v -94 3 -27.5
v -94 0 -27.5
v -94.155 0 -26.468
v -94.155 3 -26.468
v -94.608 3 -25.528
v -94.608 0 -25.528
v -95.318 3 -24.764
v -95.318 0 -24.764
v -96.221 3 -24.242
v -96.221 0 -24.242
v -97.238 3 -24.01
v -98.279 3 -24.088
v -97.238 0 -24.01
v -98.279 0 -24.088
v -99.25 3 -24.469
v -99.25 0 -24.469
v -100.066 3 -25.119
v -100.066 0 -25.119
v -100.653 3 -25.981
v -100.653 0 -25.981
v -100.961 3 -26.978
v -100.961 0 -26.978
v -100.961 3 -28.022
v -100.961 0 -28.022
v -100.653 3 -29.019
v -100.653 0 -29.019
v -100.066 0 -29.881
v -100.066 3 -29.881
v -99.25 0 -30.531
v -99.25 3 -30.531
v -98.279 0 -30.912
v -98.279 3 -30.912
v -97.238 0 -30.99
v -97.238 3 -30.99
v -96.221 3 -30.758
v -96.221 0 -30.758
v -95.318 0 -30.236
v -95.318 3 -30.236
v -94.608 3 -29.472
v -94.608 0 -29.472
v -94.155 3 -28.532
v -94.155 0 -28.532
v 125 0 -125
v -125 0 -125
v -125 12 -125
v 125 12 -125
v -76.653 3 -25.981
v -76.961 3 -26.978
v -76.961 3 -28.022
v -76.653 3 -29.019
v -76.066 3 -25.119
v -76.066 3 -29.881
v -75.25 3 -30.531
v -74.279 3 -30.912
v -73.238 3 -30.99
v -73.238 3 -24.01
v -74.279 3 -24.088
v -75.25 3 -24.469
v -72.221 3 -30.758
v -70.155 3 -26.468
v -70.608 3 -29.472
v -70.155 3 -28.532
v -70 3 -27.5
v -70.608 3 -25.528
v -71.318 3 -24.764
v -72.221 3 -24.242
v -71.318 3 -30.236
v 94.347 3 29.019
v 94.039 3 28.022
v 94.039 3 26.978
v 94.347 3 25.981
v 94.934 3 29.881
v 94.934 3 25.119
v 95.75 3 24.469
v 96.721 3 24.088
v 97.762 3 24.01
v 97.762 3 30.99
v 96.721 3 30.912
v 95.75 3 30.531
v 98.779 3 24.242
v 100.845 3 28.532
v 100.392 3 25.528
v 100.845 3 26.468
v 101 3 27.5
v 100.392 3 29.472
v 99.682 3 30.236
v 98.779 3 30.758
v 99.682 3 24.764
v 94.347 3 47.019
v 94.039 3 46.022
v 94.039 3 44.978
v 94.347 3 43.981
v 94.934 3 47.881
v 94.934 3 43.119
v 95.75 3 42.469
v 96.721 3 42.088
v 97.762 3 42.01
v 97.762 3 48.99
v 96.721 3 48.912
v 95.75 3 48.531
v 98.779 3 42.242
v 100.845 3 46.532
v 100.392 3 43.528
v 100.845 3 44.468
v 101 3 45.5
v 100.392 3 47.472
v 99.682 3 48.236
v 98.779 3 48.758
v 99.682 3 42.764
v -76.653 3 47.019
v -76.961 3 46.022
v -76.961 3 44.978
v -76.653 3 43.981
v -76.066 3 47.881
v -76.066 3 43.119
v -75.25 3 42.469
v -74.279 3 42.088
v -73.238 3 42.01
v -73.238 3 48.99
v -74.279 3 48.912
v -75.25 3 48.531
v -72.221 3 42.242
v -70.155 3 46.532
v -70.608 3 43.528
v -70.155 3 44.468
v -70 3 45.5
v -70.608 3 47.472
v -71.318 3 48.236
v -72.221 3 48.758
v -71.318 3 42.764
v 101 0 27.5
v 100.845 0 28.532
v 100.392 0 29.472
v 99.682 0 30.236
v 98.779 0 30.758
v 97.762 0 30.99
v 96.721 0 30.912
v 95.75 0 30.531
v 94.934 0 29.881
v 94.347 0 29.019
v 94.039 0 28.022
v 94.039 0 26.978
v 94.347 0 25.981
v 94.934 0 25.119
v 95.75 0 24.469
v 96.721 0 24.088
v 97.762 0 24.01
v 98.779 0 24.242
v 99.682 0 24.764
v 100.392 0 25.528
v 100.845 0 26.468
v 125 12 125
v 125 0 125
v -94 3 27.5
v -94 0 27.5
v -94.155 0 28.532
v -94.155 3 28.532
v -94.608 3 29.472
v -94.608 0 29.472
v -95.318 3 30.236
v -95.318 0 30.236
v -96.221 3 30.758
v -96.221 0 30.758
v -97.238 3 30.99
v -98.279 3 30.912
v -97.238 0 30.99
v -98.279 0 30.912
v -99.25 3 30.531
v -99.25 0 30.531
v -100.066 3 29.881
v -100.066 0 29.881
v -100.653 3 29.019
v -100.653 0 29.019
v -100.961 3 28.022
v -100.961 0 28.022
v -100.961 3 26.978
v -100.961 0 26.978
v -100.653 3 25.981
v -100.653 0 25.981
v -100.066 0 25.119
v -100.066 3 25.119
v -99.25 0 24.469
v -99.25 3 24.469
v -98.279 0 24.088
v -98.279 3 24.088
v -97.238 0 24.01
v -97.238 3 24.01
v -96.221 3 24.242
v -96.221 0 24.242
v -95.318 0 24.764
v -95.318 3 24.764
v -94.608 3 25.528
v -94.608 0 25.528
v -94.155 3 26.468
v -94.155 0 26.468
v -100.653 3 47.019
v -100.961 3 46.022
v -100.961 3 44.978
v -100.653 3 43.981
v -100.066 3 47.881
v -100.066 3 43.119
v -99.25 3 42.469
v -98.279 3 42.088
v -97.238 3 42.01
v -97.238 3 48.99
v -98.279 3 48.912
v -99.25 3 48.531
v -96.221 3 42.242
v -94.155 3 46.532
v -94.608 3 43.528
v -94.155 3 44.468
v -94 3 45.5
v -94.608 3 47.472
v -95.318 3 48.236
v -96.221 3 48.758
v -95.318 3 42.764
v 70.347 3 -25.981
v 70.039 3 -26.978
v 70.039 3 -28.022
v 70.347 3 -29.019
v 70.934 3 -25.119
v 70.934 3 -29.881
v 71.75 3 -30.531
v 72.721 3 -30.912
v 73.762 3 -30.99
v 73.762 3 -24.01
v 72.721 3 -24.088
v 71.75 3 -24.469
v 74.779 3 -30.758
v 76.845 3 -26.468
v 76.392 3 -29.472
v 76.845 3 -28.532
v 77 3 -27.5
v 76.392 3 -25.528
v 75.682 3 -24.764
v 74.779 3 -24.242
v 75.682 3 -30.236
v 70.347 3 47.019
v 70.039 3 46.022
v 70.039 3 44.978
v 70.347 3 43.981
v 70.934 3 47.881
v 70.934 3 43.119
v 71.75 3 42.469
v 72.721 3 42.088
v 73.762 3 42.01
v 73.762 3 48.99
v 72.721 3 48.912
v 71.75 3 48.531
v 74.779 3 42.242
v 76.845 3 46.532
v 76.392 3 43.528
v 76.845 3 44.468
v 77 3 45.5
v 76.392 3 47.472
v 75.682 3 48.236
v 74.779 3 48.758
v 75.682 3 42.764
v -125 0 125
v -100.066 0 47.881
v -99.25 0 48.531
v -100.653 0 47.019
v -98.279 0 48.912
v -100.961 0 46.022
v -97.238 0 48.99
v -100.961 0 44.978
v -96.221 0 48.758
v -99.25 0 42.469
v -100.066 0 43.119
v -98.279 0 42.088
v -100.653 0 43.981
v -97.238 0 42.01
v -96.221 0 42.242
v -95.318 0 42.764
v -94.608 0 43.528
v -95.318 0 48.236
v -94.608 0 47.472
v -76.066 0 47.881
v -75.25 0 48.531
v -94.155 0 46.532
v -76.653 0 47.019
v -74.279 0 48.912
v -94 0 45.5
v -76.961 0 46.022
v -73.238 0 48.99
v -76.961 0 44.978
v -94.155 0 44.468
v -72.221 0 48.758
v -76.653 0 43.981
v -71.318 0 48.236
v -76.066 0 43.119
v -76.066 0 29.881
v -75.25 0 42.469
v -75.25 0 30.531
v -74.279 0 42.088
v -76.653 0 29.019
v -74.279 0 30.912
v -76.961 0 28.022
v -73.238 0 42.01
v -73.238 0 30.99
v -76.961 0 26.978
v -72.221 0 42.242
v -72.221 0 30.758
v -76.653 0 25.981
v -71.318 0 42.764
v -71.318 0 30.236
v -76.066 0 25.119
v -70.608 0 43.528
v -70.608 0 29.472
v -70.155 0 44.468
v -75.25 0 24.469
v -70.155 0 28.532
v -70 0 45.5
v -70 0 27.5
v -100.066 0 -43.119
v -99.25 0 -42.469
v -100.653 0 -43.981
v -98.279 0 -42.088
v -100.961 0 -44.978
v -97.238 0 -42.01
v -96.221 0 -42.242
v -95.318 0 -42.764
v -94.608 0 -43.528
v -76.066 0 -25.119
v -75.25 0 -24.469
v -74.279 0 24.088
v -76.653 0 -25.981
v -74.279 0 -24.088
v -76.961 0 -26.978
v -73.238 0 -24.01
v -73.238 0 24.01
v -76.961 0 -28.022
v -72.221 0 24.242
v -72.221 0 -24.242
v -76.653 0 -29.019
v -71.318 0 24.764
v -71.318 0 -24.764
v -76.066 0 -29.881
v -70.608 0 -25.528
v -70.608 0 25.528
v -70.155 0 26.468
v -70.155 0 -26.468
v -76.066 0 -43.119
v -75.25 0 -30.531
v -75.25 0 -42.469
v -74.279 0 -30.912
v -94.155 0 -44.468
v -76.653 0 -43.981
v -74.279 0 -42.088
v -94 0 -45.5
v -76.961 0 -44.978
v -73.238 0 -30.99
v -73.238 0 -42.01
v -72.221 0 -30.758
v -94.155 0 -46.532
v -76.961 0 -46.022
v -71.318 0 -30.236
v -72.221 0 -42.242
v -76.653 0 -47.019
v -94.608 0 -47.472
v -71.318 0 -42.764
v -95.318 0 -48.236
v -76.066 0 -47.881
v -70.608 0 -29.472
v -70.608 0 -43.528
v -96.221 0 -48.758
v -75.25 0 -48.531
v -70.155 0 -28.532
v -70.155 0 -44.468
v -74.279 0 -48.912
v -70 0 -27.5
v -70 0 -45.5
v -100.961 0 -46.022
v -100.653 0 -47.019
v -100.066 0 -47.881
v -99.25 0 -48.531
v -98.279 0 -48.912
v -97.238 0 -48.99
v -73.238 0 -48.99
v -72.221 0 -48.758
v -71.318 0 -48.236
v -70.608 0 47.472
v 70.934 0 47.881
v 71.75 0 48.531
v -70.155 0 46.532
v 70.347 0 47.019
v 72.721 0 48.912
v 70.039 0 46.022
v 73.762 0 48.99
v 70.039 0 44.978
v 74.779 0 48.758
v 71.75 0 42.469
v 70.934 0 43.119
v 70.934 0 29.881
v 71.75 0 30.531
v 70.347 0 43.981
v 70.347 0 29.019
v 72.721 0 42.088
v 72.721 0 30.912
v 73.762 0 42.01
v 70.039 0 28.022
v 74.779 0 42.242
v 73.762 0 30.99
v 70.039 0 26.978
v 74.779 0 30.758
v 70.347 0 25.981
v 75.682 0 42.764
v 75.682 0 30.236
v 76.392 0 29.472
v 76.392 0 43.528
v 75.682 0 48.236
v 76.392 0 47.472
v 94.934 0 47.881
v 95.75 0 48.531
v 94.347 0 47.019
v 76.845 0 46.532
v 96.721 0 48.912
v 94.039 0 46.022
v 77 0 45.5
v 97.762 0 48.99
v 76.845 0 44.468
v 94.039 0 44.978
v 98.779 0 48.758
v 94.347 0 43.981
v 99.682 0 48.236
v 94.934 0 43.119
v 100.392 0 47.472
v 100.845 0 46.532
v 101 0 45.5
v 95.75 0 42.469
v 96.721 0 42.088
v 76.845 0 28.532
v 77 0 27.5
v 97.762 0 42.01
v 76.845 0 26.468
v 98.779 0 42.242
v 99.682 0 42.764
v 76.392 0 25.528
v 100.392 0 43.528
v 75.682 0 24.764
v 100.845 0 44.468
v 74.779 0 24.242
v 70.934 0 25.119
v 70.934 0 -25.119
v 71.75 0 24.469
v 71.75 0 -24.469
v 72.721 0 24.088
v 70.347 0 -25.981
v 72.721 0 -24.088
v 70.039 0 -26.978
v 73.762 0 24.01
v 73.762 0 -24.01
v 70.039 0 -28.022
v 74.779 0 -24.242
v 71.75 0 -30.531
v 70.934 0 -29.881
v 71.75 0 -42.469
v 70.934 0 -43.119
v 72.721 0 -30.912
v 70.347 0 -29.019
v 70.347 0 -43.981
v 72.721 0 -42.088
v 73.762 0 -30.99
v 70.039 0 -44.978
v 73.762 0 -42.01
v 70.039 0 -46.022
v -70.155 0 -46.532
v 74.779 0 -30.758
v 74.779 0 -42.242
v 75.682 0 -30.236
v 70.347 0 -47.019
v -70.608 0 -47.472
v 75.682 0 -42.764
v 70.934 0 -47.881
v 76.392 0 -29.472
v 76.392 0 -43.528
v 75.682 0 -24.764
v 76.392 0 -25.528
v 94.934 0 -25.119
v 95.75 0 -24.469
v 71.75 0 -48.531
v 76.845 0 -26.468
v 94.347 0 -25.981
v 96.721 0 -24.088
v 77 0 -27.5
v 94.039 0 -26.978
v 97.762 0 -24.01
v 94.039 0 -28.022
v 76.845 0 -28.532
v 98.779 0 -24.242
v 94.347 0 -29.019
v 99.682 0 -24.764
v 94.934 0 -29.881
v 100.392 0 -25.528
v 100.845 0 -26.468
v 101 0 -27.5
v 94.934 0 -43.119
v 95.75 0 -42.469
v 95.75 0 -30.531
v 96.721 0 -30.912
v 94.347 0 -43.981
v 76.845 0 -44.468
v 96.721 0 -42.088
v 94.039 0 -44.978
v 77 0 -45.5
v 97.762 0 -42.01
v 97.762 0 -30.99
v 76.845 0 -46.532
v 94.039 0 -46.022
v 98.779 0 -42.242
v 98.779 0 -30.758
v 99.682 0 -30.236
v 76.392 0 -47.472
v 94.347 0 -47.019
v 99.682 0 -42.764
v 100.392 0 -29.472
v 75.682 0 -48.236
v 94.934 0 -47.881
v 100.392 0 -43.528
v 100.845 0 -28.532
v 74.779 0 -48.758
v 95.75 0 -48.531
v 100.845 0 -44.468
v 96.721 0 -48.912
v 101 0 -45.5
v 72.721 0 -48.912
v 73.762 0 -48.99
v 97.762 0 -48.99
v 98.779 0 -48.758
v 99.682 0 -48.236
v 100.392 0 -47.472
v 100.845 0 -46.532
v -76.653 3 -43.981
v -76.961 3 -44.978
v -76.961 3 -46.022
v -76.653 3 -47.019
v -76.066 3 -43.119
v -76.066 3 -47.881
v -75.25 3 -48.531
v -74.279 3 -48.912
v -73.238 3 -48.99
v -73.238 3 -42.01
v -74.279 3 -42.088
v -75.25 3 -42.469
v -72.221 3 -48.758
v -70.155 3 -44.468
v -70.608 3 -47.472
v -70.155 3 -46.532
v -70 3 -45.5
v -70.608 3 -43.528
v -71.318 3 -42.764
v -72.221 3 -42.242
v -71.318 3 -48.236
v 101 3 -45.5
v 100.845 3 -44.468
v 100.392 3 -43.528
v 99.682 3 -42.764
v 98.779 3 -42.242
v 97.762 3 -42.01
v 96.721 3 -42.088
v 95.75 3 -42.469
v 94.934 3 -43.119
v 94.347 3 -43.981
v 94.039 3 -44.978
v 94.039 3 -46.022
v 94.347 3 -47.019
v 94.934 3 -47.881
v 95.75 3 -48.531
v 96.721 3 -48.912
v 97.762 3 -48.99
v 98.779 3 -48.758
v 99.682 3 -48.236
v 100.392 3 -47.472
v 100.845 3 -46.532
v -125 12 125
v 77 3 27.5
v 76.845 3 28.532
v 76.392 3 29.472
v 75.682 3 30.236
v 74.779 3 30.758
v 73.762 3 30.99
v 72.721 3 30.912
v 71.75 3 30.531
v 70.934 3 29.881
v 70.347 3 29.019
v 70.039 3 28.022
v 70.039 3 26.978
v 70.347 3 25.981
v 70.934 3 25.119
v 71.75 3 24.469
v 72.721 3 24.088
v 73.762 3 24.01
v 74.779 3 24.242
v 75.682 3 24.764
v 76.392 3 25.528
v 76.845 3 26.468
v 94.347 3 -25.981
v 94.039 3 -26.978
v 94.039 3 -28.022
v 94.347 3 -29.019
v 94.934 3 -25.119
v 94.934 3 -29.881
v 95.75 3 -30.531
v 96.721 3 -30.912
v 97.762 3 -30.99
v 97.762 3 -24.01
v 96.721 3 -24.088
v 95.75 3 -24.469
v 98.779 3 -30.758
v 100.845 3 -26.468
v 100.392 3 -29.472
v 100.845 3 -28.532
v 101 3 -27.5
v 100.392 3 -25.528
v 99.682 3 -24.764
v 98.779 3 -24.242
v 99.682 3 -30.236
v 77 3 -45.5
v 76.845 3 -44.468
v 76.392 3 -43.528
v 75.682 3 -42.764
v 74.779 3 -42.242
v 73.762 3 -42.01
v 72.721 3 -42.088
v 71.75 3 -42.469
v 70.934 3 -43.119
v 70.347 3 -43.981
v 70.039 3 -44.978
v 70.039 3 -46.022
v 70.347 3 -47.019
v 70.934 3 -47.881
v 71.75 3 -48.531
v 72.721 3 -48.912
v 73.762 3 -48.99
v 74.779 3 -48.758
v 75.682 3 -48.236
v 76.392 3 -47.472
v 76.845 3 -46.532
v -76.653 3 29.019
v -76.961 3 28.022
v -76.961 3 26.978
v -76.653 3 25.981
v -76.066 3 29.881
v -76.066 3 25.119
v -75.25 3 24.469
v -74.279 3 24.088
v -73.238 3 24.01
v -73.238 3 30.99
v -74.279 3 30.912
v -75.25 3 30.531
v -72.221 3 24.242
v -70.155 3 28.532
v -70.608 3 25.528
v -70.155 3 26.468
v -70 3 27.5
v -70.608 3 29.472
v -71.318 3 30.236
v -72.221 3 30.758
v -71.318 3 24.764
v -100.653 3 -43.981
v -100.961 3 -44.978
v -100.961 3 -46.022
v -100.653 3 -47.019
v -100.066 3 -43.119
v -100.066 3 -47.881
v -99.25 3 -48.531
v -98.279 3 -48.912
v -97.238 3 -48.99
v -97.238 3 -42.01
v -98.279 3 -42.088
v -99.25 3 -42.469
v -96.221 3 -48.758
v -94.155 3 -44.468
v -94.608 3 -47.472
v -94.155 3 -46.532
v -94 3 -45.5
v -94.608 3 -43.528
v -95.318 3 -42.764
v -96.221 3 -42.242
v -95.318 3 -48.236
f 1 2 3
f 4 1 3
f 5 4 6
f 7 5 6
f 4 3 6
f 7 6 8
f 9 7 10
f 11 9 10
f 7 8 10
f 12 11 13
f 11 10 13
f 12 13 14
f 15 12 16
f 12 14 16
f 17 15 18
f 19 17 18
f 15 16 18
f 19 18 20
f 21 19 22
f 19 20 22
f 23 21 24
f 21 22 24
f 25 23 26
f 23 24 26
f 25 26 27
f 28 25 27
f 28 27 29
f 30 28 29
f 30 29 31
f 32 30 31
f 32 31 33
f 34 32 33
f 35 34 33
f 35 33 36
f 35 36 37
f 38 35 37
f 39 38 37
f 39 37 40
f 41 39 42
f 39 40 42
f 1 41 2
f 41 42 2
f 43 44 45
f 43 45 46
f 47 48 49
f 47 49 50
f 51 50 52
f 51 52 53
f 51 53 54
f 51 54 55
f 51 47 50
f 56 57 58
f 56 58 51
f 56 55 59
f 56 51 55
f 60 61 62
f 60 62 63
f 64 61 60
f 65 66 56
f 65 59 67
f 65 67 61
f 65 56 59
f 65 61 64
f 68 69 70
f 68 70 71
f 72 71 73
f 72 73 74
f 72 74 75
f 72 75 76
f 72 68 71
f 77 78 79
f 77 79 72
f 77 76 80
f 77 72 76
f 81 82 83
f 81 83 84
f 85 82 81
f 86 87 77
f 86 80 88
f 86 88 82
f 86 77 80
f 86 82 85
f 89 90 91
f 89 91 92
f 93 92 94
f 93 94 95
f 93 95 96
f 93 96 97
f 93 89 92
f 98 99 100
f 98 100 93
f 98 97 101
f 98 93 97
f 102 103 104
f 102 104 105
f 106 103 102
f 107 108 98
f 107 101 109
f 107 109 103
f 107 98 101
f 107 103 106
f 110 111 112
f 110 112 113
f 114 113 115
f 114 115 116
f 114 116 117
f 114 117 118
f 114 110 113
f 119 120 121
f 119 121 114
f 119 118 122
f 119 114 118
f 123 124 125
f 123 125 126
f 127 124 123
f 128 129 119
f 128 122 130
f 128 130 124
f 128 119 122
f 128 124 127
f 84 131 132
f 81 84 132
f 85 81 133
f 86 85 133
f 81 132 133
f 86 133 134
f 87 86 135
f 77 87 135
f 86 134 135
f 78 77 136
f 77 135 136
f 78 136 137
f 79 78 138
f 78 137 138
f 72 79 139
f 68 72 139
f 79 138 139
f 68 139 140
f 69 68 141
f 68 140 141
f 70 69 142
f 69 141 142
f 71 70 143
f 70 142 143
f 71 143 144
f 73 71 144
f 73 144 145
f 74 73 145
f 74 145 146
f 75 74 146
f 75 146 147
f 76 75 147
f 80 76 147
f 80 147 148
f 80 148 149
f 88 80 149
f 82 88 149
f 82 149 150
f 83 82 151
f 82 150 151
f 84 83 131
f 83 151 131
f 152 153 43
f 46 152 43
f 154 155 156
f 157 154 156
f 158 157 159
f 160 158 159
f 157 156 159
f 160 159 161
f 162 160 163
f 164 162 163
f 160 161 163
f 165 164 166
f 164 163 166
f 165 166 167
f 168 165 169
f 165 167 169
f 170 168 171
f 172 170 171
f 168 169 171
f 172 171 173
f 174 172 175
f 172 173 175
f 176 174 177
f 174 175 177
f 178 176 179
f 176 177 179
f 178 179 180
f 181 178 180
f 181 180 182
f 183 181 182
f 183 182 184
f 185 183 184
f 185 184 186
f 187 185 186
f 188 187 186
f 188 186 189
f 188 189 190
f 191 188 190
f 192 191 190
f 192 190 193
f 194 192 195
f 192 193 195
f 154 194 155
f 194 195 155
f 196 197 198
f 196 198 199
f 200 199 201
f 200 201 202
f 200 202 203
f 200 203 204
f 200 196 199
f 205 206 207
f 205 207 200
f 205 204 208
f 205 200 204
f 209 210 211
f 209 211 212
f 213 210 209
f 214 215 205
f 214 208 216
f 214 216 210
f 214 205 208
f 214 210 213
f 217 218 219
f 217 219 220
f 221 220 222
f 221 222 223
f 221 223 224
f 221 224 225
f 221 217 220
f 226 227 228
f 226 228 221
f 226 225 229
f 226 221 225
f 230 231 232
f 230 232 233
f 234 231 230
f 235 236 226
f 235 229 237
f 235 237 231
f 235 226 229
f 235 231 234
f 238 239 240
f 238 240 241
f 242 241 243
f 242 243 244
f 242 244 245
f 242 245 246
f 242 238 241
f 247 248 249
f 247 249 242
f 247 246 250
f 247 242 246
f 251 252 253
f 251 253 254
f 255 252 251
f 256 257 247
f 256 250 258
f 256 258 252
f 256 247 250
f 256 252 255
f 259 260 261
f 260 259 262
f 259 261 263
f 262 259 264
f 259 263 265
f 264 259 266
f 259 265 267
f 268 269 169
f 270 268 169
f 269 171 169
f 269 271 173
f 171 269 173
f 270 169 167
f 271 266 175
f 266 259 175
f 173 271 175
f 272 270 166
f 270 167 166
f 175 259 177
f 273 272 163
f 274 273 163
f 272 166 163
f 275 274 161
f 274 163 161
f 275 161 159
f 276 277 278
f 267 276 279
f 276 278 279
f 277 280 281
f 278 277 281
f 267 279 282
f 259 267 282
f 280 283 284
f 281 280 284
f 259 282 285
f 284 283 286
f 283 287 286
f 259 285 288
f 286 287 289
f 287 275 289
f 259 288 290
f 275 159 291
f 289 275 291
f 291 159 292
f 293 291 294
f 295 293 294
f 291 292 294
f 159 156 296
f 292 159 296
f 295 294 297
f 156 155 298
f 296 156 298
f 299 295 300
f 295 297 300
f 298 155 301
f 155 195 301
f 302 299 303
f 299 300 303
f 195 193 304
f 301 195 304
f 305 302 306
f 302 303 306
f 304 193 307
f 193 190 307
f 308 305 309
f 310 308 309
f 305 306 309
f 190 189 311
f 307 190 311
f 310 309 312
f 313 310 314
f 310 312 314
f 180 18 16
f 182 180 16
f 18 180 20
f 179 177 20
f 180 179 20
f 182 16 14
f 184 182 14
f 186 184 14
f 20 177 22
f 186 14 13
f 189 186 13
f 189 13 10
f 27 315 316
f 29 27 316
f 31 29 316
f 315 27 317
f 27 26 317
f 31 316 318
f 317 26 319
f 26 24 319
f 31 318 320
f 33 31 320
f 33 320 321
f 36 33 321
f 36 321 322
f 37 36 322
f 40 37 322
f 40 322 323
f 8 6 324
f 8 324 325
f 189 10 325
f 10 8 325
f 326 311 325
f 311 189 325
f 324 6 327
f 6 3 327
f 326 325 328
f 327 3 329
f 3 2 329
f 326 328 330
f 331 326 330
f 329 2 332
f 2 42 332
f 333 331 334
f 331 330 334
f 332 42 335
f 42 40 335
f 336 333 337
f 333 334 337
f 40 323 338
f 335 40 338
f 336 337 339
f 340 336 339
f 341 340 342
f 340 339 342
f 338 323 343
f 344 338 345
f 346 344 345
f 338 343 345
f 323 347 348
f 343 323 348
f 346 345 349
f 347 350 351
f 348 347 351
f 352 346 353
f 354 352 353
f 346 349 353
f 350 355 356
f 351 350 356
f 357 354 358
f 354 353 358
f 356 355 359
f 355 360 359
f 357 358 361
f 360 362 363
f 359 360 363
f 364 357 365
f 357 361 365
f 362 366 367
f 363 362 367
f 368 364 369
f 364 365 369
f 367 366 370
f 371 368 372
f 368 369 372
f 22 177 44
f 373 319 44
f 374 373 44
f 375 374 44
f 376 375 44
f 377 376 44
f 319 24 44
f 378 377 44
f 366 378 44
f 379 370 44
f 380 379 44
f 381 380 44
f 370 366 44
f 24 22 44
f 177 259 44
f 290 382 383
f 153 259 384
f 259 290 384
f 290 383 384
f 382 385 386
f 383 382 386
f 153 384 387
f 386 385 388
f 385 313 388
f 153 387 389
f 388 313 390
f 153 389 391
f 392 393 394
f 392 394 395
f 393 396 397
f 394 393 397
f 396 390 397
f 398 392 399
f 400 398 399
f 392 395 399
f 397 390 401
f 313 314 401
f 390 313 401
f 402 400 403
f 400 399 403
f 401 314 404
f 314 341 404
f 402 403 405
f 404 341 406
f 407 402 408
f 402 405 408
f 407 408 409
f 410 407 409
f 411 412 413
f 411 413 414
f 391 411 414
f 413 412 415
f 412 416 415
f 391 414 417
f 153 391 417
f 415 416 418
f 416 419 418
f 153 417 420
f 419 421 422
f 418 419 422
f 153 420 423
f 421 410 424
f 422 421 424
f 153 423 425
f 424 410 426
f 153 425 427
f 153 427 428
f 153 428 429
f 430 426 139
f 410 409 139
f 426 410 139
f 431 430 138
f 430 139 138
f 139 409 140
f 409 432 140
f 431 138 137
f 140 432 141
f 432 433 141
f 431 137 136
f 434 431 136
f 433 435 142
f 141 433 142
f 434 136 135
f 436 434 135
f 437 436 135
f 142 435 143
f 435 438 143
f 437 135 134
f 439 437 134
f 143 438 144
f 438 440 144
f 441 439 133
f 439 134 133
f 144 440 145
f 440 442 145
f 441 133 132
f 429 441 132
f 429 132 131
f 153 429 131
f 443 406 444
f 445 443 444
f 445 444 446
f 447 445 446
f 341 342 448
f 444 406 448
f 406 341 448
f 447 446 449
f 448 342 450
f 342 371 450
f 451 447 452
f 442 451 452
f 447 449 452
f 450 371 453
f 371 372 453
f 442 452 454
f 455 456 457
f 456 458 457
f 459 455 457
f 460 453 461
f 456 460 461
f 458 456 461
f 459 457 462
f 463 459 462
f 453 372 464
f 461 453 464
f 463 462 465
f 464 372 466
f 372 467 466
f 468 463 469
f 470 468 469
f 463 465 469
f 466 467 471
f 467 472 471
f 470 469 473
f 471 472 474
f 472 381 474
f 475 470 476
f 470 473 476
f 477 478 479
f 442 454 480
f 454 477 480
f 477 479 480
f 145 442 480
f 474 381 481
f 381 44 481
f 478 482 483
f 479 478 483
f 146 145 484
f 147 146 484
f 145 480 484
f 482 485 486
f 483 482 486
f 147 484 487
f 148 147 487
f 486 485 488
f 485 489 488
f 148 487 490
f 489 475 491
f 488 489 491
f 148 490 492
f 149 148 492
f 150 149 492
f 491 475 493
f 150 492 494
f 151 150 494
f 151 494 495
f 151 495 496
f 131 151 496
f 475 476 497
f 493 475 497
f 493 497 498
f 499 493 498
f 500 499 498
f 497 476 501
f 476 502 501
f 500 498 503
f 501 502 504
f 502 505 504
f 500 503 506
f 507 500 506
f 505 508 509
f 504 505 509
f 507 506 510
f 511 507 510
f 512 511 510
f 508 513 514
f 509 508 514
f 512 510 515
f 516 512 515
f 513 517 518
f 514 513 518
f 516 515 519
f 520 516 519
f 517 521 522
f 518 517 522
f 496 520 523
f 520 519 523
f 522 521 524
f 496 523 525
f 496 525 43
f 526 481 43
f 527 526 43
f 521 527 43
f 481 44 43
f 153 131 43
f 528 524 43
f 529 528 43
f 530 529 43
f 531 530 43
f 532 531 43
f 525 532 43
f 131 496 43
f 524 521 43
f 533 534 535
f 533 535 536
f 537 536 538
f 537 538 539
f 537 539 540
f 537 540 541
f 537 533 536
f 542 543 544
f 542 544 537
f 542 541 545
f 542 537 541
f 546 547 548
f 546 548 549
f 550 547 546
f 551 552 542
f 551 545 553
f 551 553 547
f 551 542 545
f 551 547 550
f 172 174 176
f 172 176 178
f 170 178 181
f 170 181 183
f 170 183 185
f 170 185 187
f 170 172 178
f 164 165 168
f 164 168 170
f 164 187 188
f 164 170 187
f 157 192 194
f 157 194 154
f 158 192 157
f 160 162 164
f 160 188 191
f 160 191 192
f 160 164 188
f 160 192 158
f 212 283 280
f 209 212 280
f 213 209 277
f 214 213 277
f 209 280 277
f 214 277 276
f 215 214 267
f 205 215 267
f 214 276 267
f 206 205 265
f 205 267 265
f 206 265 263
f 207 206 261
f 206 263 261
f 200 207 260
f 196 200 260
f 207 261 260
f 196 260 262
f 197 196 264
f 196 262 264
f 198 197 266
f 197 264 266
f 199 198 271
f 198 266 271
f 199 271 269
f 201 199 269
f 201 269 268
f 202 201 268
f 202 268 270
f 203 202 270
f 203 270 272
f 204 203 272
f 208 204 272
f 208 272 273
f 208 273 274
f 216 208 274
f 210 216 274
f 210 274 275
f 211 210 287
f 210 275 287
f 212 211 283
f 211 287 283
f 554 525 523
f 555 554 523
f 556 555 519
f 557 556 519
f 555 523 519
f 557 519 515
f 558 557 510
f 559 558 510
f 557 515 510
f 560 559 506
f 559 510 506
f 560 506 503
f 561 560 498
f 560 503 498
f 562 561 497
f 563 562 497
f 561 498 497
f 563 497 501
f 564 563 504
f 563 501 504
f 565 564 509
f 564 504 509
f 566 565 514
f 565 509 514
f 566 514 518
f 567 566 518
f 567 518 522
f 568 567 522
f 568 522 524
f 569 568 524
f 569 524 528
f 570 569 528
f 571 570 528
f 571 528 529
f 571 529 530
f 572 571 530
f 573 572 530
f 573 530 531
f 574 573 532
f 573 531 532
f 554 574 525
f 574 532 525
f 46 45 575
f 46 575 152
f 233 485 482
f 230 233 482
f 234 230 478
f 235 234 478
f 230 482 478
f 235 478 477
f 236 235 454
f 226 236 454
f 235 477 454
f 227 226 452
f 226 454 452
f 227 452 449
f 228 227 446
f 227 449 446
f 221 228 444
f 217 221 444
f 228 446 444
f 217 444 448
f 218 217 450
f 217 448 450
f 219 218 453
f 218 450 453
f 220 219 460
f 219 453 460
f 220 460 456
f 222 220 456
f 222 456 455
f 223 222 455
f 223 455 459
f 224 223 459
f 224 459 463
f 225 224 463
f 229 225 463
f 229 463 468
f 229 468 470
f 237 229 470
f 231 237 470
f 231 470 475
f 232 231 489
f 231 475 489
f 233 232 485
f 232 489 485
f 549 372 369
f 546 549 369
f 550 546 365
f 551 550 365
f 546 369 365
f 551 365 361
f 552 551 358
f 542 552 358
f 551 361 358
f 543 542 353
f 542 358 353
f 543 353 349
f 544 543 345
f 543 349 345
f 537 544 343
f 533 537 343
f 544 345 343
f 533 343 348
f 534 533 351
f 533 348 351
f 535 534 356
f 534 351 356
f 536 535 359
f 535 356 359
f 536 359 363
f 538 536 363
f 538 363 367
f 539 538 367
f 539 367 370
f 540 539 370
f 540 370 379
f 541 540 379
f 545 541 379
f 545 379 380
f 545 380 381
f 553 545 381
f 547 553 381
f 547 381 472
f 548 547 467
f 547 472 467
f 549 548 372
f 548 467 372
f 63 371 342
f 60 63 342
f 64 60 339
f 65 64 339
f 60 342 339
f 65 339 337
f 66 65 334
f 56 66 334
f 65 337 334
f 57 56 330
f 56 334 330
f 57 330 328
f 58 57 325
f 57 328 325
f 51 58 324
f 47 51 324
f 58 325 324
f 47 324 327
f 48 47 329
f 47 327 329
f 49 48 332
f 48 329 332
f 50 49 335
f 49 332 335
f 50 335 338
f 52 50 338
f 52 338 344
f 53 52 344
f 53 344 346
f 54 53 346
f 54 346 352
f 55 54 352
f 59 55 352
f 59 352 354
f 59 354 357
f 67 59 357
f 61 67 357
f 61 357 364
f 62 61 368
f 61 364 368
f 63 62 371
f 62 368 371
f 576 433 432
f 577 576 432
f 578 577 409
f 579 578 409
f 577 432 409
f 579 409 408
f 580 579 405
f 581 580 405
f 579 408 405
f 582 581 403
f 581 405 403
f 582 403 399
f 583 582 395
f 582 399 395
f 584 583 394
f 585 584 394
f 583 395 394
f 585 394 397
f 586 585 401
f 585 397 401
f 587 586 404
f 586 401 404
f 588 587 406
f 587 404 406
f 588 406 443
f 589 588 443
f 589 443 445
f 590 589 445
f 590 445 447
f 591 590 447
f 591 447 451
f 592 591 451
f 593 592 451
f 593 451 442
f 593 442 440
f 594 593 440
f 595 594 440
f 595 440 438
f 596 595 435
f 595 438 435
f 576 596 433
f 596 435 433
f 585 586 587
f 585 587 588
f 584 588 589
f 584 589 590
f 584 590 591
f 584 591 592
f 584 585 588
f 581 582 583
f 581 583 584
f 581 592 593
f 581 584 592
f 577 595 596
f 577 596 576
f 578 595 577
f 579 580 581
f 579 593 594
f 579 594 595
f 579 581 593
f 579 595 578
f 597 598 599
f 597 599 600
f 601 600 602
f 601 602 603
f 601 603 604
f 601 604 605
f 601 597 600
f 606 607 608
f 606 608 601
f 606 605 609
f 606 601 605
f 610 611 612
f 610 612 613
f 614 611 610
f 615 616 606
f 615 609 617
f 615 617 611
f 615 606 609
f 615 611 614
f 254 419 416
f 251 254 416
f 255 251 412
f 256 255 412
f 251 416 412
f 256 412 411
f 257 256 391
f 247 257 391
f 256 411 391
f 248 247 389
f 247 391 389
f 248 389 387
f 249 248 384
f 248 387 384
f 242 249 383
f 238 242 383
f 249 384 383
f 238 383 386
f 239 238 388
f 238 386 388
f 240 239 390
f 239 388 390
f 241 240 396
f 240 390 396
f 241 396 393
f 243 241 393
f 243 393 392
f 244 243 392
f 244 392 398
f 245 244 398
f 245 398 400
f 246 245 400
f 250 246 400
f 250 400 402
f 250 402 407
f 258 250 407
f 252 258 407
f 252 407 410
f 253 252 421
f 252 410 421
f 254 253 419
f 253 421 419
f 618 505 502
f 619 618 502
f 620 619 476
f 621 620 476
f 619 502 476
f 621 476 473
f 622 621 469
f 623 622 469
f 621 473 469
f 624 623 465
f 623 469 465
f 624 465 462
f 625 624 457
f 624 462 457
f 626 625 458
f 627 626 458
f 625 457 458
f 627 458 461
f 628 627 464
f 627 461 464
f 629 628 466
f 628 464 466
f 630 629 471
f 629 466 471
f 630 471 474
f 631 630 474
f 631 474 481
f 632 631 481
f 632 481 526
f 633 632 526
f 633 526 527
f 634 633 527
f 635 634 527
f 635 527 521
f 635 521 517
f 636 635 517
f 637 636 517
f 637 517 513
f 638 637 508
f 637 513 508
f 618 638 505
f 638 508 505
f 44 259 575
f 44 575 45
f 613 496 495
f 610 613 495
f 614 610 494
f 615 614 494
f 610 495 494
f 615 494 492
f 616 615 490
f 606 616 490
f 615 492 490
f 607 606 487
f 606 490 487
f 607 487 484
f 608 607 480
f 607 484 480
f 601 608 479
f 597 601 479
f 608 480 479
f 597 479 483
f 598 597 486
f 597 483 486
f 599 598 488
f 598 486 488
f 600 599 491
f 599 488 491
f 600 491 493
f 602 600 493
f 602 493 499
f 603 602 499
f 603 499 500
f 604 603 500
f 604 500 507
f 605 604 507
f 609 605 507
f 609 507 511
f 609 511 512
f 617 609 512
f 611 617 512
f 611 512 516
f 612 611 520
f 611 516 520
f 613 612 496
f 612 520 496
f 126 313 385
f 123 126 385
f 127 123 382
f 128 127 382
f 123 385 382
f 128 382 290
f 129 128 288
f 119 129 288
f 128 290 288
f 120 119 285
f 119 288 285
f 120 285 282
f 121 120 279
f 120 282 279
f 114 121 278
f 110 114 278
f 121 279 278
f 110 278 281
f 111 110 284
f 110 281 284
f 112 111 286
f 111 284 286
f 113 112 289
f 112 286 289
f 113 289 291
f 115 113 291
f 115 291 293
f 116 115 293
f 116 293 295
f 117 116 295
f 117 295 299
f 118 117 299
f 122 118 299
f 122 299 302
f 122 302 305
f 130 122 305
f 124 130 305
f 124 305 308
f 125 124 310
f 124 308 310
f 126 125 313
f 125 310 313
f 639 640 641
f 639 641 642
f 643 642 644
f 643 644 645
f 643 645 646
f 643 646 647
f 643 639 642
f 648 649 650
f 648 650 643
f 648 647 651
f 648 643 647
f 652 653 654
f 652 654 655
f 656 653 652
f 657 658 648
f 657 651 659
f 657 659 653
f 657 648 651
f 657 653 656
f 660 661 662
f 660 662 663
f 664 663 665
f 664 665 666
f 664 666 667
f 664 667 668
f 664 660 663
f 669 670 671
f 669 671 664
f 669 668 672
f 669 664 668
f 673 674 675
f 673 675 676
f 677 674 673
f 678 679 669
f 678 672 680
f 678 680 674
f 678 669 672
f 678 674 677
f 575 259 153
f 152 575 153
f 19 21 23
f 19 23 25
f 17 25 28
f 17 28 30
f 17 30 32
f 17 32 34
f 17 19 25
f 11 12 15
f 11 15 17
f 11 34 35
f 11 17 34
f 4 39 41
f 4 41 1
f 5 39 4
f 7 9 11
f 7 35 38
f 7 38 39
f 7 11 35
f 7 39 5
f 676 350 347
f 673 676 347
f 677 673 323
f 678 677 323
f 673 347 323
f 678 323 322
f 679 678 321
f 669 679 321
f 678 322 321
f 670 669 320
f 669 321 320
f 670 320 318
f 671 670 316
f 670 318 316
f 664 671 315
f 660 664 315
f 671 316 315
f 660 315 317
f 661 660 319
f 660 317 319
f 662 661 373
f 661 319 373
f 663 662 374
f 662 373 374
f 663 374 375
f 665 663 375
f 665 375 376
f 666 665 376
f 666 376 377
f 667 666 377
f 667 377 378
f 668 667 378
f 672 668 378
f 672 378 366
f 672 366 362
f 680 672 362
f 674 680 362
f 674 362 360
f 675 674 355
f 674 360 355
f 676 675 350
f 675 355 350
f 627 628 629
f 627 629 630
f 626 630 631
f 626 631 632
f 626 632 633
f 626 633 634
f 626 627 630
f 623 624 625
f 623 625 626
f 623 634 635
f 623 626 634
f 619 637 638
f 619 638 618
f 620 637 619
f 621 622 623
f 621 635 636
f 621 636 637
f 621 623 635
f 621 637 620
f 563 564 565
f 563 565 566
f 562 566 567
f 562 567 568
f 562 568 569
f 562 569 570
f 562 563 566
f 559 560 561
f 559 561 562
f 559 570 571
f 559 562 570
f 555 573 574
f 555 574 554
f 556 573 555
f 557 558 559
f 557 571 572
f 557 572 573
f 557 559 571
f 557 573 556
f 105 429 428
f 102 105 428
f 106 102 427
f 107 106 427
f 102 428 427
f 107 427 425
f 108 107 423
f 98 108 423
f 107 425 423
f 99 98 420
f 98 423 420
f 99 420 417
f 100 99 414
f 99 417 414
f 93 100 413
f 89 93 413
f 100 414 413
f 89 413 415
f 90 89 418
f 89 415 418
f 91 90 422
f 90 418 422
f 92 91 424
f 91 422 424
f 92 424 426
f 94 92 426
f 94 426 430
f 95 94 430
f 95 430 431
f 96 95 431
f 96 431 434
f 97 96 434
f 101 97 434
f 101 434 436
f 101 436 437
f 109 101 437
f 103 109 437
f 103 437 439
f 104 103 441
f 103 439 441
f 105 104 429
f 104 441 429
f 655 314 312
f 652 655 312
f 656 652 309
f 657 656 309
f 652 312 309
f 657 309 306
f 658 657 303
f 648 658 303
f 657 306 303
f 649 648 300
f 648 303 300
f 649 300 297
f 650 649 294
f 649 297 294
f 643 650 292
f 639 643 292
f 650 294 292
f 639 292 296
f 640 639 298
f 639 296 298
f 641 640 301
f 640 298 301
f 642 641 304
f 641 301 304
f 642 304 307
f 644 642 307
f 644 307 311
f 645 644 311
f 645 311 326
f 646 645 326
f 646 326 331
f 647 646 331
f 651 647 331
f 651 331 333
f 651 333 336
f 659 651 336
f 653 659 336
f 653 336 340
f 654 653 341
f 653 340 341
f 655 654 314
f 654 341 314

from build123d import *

# Parameters (mm, degrees)
SKETCH1_W           = 250
SKETCH1_H           = 250
BOSS_EXTRUDE1_DEPTH = 12
SKETCH2_R           = 3.5
CUT_EXTRUDE1_DEPTH  = 3


with BuildPart() as part:
    # Sketch1 → Boss-Extrude1 (new body)
    with BuildSketch(Plane(origin=(0, 0, 0), x_dir=(1, 0, 0), z_dir=(0, 1, 0))):
        Rectangle(SKETCH1_W, SKETCH1_H)
    extrude(amount=BOSS_EXTRUDE1_DEPTH)

    # Sketch2 → Cut-Extrude1 (cut)
    with BuildSketch(Plane.XZ):
        with Locations((-97.5, 45.5)):
            Circle(SKETCH2_R)
        with Locations((-73.5, 45.5)):
            Circle(SKETCH2_R)
        with Locations((-97.5, 27.5)):
            Circle(SKETCH2_R)
        with Locations((-73.5, 27.5)):
            Circle(SKETCH2_R)
        with Locations((-73.5, -27.5)):
            Circle(SKETCH2_R)
        with Locations((-97.5, -27.5)):
            Circle(SKETCH2_R)
        with Locations((-73.5, -45.5)):
            Circle(SKETCH2_R)
        with Locations((-97.5, -45.5)):
            Circle(SKETCH2_R)
        with Locations((97.5, -45.5)):
            Circle(SKETCH2_R)
        with Locations((73.5, -45.5)):
            Circle(SKETCH2_R)
        with Locations((97.5, -27.5)):
            Circle(SKETCH2_R)
        with Locations((73.5, -27.5)):
            Circle(SKETCH2_R)
        with Locations((73.5, 27.5)):
            Circle(SKETCH2_R)
        with Locations((97.5, 27.5)):
            Circle(SKETCH2_R)
        with Locations((73.5, 45.5)):
            Circle(SKETCH2_R)
        with Locations((97.5, 45.5)):
            Circle(SKETCH2_R)
    extrude(amount=-CUT_EXTRUDE1_DEPTH, mode=Mode.SUBTRACT)


solid = part.part
